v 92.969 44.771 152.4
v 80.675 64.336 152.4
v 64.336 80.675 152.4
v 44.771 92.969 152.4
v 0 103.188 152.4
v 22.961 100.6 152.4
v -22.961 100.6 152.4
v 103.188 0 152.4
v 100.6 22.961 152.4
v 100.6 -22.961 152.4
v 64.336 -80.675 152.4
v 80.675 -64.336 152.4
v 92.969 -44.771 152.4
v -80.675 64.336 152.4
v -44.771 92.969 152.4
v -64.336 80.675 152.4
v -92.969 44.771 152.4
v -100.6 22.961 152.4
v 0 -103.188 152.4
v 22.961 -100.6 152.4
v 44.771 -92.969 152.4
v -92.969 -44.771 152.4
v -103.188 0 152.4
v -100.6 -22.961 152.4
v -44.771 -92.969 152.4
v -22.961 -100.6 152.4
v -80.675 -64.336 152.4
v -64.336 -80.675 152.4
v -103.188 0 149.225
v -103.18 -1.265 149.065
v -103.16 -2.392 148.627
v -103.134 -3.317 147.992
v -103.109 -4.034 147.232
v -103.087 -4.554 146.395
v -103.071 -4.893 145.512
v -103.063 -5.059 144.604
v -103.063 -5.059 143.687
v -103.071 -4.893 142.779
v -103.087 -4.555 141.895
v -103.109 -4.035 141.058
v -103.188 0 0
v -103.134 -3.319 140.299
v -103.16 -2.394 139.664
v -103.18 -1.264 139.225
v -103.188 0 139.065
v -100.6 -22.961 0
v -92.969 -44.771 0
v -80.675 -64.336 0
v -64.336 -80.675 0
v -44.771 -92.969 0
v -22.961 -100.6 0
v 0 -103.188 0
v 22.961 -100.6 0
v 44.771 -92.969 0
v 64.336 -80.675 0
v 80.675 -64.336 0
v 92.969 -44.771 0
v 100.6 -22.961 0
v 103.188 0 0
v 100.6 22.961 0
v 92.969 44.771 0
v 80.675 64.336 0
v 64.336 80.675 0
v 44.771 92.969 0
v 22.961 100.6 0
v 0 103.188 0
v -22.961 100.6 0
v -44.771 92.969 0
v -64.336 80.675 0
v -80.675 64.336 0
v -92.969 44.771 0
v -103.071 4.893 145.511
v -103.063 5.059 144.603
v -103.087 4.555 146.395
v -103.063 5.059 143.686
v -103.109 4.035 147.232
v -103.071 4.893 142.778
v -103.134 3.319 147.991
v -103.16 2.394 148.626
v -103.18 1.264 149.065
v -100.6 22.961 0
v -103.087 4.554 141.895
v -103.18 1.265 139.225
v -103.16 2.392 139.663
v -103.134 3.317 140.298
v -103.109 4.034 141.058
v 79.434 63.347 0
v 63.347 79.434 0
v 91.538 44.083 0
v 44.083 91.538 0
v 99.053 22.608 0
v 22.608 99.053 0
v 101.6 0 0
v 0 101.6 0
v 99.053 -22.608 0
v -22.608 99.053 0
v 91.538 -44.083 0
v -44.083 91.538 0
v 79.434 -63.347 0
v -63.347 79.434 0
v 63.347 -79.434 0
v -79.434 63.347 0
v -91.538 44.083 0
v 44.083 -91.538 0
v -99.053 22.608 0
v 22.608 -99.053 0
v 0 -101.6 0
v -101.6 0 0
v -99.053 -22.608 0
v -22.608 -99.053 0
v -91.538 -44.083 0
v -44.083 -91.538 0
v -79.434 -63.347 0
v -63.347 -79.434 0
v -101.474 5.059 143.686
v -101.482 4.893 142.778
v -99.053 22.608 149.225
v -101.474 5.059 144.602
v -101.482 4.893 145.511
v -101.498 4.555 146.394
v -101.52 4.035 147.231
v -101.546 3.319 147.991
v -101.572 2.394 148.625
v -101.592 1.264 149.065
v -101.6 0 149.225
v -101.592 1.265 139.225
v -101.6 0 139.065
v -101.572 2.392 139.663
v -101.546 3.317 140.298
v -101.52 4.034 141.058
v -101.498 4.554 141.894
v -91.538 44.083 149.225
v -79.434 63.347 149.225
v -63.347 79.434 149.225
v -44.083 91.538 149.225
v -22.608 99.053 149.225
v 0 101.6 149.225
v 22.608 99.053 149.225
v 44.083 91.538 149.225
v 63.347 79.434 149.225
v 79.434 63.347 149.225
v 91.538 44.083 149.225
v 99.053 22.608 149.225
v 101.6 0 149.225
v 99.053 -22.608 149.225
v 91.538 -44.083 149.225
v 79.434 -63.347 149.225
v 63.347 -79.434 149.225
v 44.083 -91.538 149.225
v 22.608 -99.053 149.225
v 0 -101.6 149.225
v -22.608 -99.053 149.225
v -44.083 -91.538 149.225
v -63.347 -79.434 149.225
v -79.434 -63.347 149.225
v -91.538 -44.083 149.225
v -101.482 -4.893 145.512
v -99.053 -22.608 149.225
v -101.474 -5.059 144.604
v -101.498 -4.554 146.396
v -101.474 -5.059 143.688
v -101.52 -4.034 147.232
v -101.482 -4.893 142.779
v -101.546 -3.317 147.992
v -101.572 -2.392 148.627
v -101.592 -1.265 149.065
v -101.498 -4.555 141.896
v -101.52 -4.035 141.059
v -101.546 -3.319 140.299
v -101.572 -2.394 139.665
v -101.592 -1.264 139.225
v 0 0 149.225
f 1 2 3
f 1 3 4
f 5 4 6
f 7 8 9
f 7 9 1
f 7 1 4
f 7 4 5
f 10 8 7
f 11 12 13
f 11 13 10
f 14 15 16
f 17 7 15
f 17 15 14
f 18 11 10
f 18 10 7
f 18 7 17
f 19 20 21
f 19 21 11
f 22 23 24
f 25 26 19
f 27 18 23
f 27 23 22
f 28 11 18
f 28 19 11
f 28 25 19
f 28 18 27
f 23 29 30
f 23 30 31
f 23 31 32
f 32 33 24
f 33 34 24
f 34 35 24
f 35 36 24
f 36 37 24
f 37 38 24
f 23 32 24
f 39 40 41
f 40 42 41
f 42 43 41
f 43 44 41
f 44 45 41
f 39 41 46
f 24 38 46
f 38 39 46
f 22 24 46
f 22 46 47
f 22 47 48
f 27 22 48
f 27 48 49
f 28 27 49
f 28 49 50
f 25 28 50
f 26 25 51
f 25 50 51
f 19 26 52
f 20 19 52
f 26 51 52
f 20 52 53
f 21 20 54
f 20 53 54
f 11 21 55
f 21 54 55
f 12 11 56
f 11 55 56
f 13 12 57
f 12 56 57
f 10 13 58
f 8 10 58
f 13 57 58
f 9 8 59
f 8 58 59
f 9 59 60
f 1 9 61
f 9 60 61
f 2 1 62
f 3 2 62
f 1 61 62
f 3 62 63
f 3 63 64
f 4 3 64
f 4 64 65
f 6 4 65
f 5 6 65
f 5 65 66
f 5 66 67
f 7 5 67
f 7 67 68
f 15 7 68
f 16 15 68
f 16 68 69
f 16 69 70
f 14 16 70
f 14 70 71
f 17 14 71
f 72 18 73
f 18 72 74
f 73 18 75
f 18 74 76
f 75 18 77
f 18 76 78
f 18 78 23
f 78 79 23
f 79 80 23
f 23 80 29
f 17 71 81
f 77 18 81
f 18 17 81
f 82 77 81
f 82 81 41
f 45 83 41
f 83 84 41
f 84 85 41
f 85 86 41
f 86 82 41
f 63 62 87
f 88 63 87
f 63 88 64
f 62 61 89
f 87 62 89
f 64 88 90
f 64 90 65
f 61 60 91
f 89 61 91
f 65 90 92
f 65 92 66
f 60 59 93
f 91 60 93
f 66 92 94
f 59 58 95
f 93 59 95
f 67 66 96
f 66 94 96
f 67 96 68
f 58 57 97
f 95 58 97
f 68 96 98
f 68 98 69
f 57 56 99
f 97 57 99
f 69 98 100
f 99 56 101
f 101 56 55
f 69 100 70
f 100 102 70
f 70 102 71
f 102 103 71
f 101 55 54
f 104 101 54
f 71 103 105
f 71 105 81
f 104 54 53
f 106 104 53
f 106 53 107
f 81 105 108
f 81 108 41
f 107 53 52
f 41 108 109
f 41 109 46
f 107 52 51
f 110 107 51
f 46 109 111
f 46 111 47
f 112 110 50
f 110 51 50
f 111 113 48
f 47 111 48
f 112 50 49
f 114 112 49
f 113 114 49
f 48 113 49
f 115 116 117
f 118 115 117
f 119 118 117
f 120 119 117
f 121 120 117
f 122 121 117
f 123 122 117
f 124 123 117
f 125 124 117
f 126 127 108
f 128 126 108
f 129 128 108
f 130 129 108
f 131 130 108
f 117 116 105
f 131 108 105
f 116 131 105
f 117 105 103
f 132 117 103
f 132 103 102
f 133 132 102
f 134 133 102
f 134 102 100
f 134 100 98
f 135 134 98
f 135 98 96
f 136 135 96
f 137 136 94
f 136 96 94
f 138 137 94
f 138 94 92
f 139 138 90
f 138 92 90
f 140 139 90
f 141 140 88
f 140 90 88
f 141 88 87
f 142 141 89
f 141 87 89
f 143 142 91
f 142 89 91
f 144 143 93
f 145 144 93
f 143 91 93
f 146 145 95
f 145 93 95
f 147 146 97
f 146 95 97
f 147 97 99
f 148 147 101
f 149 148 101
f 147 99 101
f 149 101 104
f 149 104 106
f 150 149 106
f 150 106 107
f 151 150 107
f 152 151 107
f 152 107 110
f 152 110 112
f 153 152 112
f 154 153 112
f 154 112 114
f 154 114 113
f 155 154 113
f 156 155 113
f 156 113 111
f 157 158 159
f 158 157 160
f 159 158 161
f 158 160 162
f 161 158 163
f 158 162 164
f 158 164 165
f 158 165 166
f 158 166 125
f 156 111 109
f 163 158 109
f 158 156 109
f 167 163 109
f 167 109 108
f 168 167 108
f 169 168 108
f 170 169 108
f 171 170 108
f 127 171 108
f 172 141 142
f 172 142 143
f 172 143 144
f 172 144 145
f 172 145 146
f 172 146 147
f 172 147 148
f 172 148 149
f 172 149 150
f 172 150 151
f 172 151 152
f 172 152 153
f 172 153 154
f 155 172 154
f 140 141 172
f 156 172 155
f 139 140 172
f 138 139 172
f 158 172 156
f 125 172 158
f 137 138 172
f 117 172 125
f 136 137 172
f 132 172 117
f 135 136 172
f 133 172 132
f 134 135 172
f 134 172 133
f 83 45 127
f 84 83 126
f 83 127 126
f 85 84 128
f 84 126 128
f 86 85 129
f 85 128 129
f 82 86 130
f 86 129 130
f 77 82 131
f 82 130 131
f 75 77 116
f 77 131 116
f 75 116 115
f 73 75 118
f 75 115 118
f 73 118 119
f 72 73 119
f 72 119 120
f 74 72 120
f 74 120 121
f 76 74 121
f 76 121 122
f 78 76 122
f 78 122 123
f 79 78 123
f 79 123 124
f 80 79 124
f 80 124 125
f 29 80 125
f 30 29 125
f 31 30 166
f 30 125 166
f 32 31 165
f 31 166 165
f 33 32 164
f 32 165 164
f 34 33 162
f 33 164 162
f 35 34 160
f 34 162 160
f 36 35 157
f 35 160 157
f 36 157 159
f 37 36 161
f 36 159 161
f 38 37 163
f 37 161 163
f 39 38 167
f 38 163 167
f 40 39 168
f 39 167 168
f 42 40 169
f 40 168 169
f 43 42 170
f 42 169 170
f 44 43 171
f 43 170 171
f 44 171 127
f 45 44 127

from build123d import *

# Parameters (mm, degrees)
SKETCH1_R           = 103.1875
BOSS_EXTRUDE1_DEPTH = 152.4
SKETCH2_R           = 101.6
CUT_EXTRUDE1_DEPTH  = 149.225
SKETCH3_R           = 5.08
CUT_EXTRUDE2_DEPTH  = 212.000190314


with BuildPart() as part:
    # Sketch1 → Boss-Extrude1 (new body)
    with BuildSketch(Plane.XY):
        with Locations(Location((0, 0, 0), (0, 0, 180))):
            Circle(SKETCH1_R)
    extrude(amount=BOSS_EXTRUDE1_DEPTH)

    # Sketch2 → Cut-Extrude1 (cut)
    with BuildSketch(Plane(origin=(0, 0, 0), x_dir=(-1, 0, 0), z_dir=(0, 0, -1))):
        Circle(SKETCH2_R)
    extrude(amount=-CUT_EXTRUDE1_DEPTH, mode=Mode.SUBTRACT)

    # Sketch3 → Cut-Extrude2 (cut, through all)
    with BuildSketch(Plane(origin=(0, 0, 0), x_dir=(0, 0, -1), z_dir=(1, 0, 0))):
        with Locations((-144.145, 0)):
            Circle(SKETCH3_R)
    extrude(amount=-CUT_EXTRUDE2_DEPTH, mode=Mode.SUBTRACT)


solid = part.part
